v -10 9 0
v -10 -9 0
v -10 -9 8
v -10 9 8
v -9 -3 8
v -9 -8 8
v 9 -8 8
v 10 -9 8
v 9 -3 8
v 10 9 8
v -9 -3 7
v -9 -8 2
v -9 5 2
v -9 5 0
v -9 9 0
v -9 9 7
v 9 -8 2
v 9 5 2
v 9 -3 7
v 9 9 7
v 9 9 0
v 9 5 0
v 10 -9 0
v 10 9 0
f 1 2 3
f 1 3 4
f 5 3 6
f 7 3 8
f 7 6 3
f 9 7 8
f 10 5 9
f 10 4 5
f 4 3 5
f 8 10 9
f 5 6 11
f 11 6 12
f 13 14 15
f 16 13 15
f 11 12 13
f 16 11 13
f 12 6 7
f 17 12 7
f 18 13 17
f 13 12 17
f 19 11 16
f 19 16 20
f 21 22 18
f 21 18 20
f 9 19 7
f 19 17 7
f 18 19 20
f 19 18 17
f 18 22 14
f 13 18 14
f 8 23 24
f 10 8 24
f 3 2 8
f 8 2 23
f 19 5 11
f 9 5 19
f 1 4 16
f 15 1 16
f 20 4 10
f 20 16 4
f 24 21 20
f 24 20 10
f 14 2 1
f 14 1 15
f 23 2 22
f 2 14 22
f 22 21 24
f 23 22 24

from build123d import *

# Parameters (mm, degrees)
SKETCH1_W           = 20
SKETCH1_H           = 18
BOSS_EXTRUDE1_DEPTH = 8
SKETCH2_W           = 18
SKETCH2_H           = 5
CUT_EXTRUDE1_DEPTH  = 6
SKETCH4_W           = 18
SKETCH4_H           = 5
CUT_EXTRUDE2_DEPTH  = 13
SKETCH5_W           = 18
SKETCH5_H           = 4
CUT_EXTRUDE3_DEPTH  = 4


with BuildPart() as part:
    # Sketch1 → Boss-Extrude1 (new body)
    with BuildSketch(Plane.XY):
        Rectangle(SKETCH1_W, SKETCH1_H)
    extrude(amount=BOSS_EXTRUDE1_DEPTH)

    # Sketch2 → Cut-Extrude1 (cut)
    with BuildSketch(Plane.XY.offset(8)):
        with Locations((0, -5.5)):
            Rectangle(SKETCH2_W, SKETCH2_H)
    extrude(amount=-CUT_EXTRUDE1_DEPTH, mode=Mode.SUBTRACT)

    # Sketch4 → Cut-Extrude2 (cut)
    with BuildSketch(Plane.XZ.offset(3)):
        with Locations((0, 4.5)):
            Rectangle(SKETCH4_W, SKETCH4_H)
    extrude(amount=-CUT_EXTRUDE2_DEPTH, mode=Mode.SUBTRACT)

    # Sketch5 → Cut-Extrude3 (cut)
    with BuildSketch(Plane(origin=(0, 0, 0), x_dir=(-1, 0, 0), z_dir=(0, 0, -1))):
        with Locations((0, 7)):
            Rectangle(SKETCH5_W, SKETCH5_H)
    extrude(amount=-CUT_EXTRUDE3_DEPTH, mode=Mode.SUBTRACT)


solid = part.part
